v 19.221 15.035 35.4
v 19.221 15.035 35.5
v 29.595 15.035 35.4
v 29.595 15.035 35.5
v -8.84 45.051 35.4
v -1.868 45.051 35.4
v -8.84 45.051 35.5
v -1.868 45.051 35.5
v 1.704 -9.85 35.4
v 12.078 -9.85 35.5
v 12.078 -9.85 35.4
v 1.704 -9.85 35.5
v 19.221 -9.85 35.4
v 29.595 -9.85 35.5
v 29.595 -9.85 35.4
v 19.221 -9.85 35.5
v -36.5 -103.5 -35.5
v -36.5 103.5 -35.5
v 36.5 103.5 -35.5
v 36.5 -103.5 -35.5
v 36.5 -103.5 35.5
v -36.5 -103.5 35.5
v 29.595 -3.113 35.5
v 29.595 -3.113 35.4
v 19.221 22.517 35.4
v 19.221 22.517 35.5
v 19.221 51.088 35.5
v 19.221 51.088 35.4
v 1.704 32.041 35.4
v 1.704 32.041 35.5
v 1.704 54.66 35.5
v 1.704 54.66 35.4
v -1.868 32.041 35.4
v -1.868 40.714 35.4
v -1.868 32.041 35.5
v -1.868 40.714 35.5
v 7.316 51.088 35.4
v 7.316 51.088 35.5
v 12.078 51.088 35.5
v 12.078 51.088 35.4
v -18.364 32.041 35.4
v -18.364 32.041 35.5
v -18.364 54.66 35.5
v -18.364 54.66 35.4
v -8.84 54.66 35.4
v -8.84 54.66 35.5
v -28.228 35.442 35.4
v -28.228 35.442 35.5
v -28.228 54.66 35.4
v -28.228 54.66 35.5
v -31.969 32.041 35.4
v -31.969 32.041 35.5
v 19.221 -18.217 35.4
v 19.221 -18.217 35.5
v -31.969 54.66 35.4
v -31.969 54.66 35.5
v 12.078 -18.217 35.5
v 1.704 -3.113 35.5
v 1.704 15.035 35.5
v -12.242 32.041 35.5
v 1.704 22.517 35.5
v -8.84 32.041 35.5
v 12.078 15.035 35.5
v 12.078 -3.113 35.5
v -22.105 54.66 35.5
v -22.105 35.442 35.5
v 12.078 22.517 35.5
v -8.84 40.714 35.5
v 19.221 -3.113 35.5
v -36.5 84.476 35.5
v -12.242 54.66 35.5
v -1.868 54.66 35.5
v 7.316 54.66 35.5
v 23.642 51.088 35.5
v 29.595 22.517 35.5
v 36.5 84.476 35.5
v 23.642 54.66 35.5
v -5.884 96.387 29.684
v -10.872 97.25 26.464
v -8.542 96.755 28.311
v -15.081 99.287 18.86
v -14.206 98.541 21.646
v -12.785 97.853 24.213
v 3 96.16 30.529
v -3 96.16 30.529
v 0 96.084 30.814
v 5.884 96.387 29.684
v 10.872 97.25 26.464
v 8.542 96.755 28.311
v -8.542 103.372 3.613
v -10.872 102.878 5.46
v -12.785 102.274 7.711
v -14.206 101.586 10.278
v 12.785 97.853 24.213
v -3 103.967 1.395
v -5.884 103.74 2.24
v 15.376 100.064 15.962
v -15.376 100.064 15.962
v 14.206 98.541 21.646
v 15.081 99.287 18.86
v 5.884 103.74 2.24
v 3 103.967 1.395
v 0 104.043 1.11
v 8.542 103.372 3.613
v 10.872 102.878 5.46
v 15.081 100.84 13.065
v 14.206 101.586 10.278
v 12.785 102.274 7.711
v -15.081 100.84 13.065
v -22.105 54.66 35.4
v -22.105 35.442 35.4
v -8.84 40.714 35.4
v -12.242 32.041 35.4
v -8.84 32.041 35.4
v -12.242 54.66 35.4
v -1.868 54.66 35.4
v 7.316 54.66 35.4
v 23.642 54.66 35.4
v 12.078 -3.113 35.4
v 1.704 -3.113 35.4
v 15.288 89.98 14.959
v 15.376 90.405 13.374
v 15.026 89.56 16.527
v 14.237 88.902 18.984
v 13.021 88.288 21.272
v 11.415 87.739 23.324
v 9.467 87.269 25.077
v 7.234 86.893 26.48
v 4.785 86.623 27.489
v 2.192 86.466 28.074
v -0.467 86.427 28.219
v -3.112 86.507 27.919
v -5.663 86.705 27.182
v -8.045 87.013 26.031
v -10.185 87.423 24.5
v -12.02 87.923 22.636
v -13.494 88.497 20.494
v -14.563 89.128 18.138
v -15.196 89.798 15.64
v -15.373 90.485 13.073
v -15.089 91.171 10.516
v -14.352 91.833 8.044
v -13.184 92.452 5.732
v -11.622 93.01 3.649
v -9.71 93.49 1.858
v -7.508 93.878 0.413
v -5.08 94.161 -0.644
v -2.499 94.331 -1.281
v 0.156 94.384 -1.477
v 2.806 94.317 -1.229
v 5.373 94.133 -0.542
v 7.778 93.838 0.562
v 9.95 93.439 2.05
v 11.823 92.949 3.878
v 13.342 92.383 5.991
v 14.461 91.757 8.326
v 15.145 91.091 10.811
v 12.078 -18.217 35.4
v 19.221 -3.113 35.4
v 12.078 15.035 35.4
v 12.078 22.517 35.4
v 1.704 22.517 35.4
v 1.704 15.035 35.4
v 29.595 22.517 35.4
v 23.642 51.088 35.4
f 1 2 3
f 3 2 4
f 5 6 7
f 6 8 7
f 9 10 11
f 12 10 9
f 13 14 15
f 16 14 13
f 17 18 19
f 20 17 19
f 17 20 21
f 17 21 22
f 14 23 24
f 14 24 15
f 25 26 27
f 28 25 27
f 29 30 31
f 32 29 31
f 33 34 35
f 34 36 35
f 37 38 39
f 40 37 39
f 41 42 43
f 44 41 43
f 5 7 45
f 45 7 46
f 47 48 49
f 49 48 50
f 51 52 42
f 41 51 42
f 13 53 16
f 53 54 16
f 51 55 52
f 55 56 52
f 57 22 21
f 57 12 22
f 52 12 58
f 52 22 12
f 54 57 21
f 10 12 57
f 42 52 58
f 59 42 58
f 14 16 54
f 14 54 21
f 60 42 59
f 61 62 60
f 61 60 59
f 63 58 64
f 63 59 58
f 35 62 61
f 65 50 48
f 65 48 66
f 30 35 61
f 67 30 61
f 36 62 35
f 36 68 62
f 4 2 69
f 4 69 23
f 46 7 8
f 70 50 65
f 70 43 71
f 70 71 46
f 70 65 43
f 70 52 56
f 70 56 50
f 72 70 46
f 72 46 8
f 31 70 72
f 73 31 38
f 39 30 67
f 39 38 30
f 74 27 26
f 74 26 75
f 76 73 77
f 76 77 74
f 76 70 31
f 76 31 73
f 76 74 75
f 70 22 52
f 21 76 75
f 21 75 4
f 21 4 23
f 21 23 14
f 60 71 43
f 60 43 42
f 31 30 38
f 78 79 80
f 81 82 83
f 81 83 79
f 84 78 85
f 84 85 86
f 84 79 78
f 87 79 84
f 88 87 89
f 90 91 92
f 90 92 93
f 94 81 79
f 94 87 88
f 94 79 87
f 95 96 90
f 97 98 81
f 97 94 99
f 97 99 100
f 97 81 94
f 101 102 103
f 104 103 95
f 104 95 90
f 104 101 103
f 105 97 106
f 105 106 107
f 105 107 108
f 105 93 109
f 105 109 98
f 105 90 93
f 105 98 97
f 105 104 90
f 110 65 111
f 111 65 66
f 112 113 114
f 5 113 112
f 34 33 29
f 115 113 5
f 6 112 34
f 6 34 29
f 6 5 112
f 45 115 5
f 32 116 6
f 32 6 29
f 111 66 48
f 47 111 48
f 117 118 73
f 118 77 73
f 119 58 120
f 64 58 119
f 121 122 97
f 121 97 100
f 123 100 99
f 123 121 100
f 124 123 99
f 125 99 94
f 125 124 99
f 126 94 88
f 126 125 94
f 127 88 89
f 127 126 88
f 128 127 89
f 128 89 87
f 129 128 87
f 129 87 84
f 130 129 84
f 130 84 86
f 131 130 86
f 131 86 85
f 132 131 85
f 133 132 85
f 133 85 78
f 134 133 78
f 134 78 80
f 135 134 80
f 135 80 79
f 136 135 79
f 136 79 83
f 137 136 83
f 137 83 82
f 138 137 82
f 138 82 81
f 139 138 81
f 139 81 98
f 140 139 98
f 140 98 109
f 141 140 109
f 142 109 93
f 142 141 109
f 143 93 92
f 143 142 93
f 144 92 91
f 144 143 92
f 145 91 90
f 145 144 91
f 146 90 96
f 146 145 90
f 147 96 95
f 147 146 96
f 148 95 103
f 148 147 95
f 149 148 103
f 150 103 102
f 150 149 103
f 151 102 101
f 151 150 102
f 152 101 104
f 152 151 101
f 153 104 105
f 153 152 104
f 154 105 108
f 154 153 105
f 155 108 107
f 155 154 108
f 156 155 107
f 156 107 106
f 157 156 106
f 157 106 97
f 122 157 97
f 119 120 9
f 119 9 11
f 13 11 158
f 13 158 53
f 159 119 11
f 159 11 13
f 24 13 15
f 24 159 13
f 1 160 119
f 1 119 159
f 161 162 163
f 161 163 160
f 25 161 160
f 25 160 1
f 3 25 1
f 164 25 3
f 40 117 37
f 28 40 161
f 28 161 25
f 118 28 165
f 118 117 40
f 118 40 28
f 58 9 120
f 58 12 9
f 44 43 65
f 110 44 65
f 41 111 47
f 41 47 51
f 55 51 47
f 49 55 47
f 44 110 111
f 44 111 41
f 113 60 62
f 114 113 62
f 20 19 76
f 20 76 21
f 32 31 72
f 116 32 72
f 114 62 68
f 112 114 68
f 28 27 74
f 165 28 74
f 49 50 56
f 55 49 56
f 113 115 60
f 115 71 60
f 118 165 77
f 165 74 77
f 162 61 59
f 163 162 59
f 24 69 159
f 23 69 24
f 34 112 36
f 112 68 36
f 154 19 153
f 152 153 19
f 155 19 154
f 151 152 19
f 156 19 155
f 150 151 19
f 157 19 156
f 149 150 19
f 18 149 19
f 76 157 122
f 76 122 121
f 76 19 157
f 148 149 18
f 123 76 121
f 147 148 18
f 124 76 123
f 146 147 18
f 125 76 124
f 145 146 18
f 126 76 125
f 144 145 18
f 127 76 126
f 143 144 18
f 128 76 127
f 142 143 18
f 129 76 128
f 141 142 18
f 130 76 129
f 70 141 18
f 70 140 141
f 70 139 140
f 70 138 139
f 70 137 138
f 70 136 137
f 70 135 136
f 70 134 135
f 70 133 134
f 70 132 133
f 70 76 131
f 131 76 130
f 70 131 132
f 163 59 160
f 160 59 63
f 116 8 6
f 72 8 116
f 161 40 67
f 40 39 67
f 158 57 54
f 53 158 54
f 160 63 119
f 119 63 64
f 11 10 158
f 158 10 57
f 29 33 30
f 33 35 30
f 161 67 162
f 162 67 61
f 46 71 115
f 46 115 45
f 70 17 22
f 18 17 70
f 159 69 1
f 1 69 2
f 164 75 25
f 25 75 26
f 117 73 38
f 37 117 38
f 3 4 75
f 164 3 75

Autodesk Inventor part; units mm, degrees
ref_plane "YZ Plane" through (0, 0, 0) normal (1, 0, 0) x (0, 1, 0)
ref_plane "XZ Plane" through (0, 0, 0) normal (0, 1, 0) x (-1, 0, 0)
ref_plane "XY Plane" through (0, 0, 0) normal (0, 0, 1) x (1, 0, 0)
sketch "Skizze1" plane through (0, 0, 0) normal (0, 0, 1) x (1, 0, 0)
  line L0 (-36.5, 103.5) -> (36.5, 103.5)
  line L1 (36.5, 103.5) -> (36.5, -103.5)
  line L2 (36.5, -103.5) -> (-36.5, -103.5)
  line L3 (-36.5, -103.5) -> (-36.5, 103.5)
  point P0 (0, 0)
  point P1 (0, 103.5)
  point P2 (-36.5, 0)
  dimension "d0" = 73
  dimension "d1" = 207
extrude "Extrusion1" add sketch "Skizze1" along normal mid plane 71
sketch "Skizze2" plane through (0, 0, 35.5) normal (0, 0, 1) x (1, 0, 0)
  line L0 (-31.9691, 54.6598) -> (-31.9691, 32.0411)
  line L1 (-31.9691, 32.0411) -> (-18.3639, 32.0411)
  line L2 (-18.3639, 32.0411) -> (-18.3639, 54.6598)
  line L3 (-18.3639, 54.6598) -> (-22.1053, 54.6598)
  line L4 (-22.1053, 54.6598) -> (-22.1053, 35.4424)
  line L5 (-22.1053, 35.4424) -> (-28.2277, 35.4424)
  line L6 (-28.2277, 35.4424) -> (-28.2277, 54.6598)
  line L7 (-28.2277, 54.6598) -> (-31.9691, 54.6598)
  line L8 (-12.2415, 54.6598) -> (-12.2415, 32.0411)
  line L9 (-12.2415, 32.0411) -> (-8.8402, 32.0411)
  line L10 (-8.8402, 32.0411) -> (-8.8402, 40.7145)
  line L11 (-8.8402, 40.7145) -> (-1.8675, 40.7145)
  line L12 (-1.8675, 40.7145) -> (-1.8675, 32.0411)
  line L13 (-1.8675, 32.0411) -> (1.7039, 32.0411)
  line L14 (1.7039, 32.0411) -> (1.7039, 54.6598)
  line L15 (1.7039, 54.6598) -> (-1.8675, 54.6598)
  line L16 (-1.8675, 45.0511) -> (-1.8675, 54.6598)
  line L17 (-1.8675, 45.0511) -> (-8.8402, 45.0511)
  line L18 (-8.8402, 45.0511) -> (-8.8402, 54.6598)
  line L19 (-12.2415, 54.6598) -> (-8.8402, 54.6598)
  line L20 (7.316, 54.6598) -> (7.316, 51.0885)
  line L21 (7.316, 51.0885) -> (12.0779, 51.0885)
  line L22 (12.0779, 51.0885) -> (12.0779, -18.2168)
  line L23 (12.0779, -18.2168) -> (19.2206, -18.2168)
  line L24 (19.2206, -18.2168) -> (19.2206, 51.0885)
  line L25 (19.2206, 51.0885) -> (23.6423, 51.0885)
  line L26 (23.6423, 51.0885) -> (23.6423, 54.6598)
  line L27 (23.6423, 54.6598) -> (7.316, 54.6598)
  line L28 (1.7039, 22.5174) -> (1.7039, 15.0346)
  line L29 (1.7039, 15.0346) -> (29.5946, 15.0346)
  line L30 (29.5946, 15.0346) -> (29.5946, 22.5174)
  line L31 (29.5946, 22.5174) -> (1.7039, 22.5174)
  line L32 (1.7039, -3.1128) -> (29.5946, -3.1128)
  line L33 (29.5946, -3.1128) -> (29.5946, -9.8501)
  line L34 (29.5946, -9.8501) -> (1.7039, -9.8501)
  line L35 (1.7039, -9.8501) -> (1.7039, -3.1128)
  point P0 (0, 0)
  point P1 (12.0779, 22.5174)
  point P2 (12.0779, 15.0346)
  point P3 (19.2206, 15.0346)
  point P4 (19.2206, 22.5174)
  point P5 (19.2206, -3.1128)
  point P6 (19.2206, -9.8501)
  point P7 (12.0779, -9.8501)
  point P8 (12.0779, -3.1128)
extrude "Extrusion2" cut sketch "Skizze2" against normal blind 0.1
chamfer "Fase1" distance 71 angle 15 1 edges at (0, 103.5, 35.5) measured on face at (12.1667, 103.5, -11.8333)
sketch "Skizze3" plane through (-36.5, 84.4756, 35.5) normal (0, 0.9659, 0.2588) x (1, 0, 0)
  circle A0 centre (36.5, 22.9067) radius 15.376
  point P0 (36.5, 12.4265)
extrude "Extrusion3" add sketch "Skizze3" along normal blind 10
properties part number "milch"
